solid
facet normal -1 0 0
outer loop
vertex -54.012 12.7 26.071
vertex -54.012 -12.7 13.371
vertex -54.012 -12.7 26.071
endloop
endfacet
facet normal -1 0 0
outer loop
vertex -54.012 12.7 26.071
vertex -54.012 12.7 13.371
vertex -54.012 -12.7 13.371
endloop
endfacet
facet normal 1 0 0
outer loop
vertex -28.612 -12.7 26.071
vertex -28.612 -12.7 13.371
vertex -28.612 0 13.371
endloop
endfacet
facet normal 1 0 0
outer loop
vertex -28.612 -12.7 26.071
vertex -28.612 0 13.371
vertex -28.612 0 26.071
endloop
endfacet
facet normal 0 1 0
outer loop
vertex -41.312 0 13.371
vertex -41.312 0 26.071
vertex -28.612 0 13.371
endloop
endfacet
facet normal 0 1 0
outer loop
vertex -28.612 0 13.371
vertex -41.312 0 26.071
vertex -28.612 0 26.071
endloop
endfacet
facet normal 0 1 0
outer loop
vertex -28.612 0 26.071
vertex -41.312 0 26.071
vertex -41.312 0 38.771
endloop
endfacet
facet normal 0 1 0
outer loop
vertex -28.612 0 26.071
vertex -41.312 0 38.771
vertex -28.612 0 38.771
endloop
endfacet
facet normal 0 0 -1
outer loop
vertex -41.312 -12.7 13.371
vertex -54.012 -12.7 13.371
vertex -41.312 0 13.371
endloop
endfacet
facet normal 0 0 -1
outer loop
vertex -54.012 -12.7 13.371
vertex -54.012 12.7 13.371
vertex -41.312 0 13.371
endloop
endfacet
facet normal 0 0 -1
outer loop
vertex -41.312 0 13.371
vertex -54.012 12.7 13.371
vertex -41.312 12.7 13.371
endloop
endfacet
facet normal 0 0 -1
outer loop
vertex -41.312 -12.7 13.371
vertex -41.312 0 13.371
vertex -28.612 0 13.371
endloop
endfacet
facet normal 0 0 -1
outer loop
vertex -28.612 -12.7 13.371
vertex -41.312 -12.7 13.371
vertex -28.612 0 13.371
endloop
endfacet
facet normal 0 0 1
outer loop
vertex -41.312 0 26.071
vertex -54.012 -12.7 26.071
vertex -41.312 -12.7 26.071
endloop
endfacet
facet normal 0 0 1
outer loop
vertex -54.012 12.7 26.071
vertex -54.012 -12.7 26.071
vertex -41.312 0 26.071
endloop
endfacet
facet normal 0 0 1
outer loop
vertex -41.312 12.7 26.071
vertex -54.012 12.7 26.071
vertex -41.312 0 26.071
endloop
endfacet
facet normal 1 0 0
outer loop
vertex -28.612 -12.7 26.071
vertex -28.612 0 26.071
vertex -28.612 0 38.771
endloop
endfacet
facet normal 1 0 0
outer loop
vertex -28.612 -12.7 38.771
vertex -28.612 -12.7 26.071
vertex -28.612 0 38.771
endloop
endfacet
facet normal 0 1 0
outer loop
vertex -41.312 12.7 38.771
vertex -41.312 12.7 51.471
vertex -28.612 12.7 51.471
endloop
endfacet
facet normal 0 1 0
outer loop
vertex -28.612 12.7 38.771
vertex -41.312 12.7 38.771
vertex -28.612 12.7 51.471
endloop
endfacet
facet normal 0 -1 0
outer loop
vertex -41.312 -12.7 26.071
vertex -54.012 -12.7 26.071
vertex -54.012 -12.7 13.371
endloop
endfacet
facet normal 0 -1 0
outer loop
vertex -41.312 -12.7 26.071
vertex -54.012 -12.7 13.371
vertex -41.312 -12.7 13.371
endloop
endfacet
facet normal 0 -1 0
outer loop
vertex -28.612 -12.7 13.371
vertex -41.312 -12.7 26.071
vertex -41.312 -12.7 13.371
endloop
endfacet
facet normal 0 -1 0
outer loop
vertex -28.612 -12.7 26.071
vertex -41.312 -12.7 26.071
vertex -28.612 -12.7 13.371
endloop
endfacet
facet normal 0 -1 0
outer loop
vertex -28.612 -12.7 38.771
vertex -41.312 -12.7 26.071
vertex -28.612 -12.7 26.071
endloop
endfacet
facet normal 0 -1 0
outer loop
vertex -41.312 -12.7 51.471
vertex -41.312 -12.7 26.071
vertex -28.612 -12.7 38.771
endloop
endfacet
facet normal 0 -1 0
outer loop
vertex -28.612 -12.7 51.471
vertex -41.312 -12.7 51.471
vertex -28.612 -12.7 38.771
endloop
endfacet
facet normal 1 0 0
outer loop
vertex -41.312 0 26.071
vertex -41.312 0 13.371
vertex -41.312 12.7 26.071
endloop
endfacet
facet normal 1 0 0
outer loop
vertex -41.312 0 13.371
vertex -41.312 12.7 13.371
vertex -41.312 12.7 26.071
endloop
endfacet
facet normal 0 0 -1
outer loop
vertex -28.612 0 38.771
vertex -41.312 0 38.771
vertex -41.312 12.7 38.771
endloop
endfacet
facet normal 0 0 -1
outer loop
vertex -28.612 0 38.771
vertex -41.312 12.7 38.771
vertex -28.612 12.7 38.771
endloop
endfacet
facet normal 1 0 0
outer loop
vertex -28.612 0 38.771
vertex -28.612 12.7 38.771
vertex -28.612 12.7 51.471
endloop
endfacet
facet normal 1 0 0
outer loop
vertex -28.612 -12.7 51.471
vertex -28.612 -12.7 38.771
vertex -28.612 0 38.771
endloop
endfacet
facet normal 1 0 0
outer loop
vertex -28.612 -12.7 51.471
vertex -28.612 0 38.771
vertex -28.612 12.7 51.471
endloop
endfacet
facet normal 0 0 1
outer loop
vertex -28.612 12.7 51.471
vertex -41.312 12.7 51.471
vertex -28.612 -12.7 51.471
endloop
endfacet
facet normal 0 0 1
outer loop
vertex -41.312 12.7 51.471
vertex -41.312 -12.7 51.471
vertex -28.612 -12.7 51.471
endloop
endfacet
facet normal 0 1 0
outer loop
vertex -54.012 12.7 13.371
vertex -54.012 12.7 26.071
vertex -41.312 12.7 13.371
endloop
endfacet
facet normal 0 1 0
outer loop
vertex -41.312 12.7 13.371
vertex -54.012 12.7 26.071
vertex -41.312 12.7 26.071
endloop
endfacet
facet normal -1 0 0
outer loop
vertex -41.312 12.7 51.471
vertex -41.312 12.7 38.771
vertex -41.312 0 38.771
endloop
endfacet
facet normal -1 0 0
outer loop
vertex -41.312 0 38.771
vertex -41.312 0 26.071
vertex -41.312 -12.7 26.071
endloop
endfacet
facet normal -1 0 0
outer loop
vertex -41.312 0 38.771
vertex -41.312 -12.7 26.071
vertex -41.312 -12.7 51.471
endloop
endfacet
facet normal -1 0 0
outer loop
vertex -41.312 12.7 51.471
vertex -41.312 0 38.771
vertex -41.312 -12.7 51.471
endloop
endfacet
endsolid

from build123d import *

# Parameters (mm, degrees)
F1_DEPTH = 12.7
F0_W     = 12.7
F0_H     = 12.7
F2_DEPTH = 12.7


# Not quite as in the source:
# - ends of sketch curves that miss each other by under 0.0002 mm in the source are joined


with BuildPart() as f1:
    # F0 (on Front) → F1 (new body)
    with BuildSketch(Plane.XZ):
        Polygon((-28.6124870216, 26.0709726285), (-41.3124847398, 26.0709726285), (-41.3124847398, 13.3709726285), (-28.6124870216, 13.3709749104), align=None)
        Polygon((-41.3124847398, 38.7709726285), (-41.3124847398, 26.0709726285), (-28.6124870216, 26.0709726285), (-28.6124847398, 38.7709726285), align=None)
    extrude(amount=F1_DEPTH)

    # F0 (on Front) → F2 (join, symmetric)
    with BuildSketch(Plane.XZ):
        with Locations((-47.6624847398, 19.7209726285)):
            Rectangle(F0_W, F0_H)
        with Locations((-34.9624847398, 45.1209726285)):
            Rectangle(F0_W, F0_H)
    extrude(amount=F2_DEPTH, both=True)


solid = f1.part
